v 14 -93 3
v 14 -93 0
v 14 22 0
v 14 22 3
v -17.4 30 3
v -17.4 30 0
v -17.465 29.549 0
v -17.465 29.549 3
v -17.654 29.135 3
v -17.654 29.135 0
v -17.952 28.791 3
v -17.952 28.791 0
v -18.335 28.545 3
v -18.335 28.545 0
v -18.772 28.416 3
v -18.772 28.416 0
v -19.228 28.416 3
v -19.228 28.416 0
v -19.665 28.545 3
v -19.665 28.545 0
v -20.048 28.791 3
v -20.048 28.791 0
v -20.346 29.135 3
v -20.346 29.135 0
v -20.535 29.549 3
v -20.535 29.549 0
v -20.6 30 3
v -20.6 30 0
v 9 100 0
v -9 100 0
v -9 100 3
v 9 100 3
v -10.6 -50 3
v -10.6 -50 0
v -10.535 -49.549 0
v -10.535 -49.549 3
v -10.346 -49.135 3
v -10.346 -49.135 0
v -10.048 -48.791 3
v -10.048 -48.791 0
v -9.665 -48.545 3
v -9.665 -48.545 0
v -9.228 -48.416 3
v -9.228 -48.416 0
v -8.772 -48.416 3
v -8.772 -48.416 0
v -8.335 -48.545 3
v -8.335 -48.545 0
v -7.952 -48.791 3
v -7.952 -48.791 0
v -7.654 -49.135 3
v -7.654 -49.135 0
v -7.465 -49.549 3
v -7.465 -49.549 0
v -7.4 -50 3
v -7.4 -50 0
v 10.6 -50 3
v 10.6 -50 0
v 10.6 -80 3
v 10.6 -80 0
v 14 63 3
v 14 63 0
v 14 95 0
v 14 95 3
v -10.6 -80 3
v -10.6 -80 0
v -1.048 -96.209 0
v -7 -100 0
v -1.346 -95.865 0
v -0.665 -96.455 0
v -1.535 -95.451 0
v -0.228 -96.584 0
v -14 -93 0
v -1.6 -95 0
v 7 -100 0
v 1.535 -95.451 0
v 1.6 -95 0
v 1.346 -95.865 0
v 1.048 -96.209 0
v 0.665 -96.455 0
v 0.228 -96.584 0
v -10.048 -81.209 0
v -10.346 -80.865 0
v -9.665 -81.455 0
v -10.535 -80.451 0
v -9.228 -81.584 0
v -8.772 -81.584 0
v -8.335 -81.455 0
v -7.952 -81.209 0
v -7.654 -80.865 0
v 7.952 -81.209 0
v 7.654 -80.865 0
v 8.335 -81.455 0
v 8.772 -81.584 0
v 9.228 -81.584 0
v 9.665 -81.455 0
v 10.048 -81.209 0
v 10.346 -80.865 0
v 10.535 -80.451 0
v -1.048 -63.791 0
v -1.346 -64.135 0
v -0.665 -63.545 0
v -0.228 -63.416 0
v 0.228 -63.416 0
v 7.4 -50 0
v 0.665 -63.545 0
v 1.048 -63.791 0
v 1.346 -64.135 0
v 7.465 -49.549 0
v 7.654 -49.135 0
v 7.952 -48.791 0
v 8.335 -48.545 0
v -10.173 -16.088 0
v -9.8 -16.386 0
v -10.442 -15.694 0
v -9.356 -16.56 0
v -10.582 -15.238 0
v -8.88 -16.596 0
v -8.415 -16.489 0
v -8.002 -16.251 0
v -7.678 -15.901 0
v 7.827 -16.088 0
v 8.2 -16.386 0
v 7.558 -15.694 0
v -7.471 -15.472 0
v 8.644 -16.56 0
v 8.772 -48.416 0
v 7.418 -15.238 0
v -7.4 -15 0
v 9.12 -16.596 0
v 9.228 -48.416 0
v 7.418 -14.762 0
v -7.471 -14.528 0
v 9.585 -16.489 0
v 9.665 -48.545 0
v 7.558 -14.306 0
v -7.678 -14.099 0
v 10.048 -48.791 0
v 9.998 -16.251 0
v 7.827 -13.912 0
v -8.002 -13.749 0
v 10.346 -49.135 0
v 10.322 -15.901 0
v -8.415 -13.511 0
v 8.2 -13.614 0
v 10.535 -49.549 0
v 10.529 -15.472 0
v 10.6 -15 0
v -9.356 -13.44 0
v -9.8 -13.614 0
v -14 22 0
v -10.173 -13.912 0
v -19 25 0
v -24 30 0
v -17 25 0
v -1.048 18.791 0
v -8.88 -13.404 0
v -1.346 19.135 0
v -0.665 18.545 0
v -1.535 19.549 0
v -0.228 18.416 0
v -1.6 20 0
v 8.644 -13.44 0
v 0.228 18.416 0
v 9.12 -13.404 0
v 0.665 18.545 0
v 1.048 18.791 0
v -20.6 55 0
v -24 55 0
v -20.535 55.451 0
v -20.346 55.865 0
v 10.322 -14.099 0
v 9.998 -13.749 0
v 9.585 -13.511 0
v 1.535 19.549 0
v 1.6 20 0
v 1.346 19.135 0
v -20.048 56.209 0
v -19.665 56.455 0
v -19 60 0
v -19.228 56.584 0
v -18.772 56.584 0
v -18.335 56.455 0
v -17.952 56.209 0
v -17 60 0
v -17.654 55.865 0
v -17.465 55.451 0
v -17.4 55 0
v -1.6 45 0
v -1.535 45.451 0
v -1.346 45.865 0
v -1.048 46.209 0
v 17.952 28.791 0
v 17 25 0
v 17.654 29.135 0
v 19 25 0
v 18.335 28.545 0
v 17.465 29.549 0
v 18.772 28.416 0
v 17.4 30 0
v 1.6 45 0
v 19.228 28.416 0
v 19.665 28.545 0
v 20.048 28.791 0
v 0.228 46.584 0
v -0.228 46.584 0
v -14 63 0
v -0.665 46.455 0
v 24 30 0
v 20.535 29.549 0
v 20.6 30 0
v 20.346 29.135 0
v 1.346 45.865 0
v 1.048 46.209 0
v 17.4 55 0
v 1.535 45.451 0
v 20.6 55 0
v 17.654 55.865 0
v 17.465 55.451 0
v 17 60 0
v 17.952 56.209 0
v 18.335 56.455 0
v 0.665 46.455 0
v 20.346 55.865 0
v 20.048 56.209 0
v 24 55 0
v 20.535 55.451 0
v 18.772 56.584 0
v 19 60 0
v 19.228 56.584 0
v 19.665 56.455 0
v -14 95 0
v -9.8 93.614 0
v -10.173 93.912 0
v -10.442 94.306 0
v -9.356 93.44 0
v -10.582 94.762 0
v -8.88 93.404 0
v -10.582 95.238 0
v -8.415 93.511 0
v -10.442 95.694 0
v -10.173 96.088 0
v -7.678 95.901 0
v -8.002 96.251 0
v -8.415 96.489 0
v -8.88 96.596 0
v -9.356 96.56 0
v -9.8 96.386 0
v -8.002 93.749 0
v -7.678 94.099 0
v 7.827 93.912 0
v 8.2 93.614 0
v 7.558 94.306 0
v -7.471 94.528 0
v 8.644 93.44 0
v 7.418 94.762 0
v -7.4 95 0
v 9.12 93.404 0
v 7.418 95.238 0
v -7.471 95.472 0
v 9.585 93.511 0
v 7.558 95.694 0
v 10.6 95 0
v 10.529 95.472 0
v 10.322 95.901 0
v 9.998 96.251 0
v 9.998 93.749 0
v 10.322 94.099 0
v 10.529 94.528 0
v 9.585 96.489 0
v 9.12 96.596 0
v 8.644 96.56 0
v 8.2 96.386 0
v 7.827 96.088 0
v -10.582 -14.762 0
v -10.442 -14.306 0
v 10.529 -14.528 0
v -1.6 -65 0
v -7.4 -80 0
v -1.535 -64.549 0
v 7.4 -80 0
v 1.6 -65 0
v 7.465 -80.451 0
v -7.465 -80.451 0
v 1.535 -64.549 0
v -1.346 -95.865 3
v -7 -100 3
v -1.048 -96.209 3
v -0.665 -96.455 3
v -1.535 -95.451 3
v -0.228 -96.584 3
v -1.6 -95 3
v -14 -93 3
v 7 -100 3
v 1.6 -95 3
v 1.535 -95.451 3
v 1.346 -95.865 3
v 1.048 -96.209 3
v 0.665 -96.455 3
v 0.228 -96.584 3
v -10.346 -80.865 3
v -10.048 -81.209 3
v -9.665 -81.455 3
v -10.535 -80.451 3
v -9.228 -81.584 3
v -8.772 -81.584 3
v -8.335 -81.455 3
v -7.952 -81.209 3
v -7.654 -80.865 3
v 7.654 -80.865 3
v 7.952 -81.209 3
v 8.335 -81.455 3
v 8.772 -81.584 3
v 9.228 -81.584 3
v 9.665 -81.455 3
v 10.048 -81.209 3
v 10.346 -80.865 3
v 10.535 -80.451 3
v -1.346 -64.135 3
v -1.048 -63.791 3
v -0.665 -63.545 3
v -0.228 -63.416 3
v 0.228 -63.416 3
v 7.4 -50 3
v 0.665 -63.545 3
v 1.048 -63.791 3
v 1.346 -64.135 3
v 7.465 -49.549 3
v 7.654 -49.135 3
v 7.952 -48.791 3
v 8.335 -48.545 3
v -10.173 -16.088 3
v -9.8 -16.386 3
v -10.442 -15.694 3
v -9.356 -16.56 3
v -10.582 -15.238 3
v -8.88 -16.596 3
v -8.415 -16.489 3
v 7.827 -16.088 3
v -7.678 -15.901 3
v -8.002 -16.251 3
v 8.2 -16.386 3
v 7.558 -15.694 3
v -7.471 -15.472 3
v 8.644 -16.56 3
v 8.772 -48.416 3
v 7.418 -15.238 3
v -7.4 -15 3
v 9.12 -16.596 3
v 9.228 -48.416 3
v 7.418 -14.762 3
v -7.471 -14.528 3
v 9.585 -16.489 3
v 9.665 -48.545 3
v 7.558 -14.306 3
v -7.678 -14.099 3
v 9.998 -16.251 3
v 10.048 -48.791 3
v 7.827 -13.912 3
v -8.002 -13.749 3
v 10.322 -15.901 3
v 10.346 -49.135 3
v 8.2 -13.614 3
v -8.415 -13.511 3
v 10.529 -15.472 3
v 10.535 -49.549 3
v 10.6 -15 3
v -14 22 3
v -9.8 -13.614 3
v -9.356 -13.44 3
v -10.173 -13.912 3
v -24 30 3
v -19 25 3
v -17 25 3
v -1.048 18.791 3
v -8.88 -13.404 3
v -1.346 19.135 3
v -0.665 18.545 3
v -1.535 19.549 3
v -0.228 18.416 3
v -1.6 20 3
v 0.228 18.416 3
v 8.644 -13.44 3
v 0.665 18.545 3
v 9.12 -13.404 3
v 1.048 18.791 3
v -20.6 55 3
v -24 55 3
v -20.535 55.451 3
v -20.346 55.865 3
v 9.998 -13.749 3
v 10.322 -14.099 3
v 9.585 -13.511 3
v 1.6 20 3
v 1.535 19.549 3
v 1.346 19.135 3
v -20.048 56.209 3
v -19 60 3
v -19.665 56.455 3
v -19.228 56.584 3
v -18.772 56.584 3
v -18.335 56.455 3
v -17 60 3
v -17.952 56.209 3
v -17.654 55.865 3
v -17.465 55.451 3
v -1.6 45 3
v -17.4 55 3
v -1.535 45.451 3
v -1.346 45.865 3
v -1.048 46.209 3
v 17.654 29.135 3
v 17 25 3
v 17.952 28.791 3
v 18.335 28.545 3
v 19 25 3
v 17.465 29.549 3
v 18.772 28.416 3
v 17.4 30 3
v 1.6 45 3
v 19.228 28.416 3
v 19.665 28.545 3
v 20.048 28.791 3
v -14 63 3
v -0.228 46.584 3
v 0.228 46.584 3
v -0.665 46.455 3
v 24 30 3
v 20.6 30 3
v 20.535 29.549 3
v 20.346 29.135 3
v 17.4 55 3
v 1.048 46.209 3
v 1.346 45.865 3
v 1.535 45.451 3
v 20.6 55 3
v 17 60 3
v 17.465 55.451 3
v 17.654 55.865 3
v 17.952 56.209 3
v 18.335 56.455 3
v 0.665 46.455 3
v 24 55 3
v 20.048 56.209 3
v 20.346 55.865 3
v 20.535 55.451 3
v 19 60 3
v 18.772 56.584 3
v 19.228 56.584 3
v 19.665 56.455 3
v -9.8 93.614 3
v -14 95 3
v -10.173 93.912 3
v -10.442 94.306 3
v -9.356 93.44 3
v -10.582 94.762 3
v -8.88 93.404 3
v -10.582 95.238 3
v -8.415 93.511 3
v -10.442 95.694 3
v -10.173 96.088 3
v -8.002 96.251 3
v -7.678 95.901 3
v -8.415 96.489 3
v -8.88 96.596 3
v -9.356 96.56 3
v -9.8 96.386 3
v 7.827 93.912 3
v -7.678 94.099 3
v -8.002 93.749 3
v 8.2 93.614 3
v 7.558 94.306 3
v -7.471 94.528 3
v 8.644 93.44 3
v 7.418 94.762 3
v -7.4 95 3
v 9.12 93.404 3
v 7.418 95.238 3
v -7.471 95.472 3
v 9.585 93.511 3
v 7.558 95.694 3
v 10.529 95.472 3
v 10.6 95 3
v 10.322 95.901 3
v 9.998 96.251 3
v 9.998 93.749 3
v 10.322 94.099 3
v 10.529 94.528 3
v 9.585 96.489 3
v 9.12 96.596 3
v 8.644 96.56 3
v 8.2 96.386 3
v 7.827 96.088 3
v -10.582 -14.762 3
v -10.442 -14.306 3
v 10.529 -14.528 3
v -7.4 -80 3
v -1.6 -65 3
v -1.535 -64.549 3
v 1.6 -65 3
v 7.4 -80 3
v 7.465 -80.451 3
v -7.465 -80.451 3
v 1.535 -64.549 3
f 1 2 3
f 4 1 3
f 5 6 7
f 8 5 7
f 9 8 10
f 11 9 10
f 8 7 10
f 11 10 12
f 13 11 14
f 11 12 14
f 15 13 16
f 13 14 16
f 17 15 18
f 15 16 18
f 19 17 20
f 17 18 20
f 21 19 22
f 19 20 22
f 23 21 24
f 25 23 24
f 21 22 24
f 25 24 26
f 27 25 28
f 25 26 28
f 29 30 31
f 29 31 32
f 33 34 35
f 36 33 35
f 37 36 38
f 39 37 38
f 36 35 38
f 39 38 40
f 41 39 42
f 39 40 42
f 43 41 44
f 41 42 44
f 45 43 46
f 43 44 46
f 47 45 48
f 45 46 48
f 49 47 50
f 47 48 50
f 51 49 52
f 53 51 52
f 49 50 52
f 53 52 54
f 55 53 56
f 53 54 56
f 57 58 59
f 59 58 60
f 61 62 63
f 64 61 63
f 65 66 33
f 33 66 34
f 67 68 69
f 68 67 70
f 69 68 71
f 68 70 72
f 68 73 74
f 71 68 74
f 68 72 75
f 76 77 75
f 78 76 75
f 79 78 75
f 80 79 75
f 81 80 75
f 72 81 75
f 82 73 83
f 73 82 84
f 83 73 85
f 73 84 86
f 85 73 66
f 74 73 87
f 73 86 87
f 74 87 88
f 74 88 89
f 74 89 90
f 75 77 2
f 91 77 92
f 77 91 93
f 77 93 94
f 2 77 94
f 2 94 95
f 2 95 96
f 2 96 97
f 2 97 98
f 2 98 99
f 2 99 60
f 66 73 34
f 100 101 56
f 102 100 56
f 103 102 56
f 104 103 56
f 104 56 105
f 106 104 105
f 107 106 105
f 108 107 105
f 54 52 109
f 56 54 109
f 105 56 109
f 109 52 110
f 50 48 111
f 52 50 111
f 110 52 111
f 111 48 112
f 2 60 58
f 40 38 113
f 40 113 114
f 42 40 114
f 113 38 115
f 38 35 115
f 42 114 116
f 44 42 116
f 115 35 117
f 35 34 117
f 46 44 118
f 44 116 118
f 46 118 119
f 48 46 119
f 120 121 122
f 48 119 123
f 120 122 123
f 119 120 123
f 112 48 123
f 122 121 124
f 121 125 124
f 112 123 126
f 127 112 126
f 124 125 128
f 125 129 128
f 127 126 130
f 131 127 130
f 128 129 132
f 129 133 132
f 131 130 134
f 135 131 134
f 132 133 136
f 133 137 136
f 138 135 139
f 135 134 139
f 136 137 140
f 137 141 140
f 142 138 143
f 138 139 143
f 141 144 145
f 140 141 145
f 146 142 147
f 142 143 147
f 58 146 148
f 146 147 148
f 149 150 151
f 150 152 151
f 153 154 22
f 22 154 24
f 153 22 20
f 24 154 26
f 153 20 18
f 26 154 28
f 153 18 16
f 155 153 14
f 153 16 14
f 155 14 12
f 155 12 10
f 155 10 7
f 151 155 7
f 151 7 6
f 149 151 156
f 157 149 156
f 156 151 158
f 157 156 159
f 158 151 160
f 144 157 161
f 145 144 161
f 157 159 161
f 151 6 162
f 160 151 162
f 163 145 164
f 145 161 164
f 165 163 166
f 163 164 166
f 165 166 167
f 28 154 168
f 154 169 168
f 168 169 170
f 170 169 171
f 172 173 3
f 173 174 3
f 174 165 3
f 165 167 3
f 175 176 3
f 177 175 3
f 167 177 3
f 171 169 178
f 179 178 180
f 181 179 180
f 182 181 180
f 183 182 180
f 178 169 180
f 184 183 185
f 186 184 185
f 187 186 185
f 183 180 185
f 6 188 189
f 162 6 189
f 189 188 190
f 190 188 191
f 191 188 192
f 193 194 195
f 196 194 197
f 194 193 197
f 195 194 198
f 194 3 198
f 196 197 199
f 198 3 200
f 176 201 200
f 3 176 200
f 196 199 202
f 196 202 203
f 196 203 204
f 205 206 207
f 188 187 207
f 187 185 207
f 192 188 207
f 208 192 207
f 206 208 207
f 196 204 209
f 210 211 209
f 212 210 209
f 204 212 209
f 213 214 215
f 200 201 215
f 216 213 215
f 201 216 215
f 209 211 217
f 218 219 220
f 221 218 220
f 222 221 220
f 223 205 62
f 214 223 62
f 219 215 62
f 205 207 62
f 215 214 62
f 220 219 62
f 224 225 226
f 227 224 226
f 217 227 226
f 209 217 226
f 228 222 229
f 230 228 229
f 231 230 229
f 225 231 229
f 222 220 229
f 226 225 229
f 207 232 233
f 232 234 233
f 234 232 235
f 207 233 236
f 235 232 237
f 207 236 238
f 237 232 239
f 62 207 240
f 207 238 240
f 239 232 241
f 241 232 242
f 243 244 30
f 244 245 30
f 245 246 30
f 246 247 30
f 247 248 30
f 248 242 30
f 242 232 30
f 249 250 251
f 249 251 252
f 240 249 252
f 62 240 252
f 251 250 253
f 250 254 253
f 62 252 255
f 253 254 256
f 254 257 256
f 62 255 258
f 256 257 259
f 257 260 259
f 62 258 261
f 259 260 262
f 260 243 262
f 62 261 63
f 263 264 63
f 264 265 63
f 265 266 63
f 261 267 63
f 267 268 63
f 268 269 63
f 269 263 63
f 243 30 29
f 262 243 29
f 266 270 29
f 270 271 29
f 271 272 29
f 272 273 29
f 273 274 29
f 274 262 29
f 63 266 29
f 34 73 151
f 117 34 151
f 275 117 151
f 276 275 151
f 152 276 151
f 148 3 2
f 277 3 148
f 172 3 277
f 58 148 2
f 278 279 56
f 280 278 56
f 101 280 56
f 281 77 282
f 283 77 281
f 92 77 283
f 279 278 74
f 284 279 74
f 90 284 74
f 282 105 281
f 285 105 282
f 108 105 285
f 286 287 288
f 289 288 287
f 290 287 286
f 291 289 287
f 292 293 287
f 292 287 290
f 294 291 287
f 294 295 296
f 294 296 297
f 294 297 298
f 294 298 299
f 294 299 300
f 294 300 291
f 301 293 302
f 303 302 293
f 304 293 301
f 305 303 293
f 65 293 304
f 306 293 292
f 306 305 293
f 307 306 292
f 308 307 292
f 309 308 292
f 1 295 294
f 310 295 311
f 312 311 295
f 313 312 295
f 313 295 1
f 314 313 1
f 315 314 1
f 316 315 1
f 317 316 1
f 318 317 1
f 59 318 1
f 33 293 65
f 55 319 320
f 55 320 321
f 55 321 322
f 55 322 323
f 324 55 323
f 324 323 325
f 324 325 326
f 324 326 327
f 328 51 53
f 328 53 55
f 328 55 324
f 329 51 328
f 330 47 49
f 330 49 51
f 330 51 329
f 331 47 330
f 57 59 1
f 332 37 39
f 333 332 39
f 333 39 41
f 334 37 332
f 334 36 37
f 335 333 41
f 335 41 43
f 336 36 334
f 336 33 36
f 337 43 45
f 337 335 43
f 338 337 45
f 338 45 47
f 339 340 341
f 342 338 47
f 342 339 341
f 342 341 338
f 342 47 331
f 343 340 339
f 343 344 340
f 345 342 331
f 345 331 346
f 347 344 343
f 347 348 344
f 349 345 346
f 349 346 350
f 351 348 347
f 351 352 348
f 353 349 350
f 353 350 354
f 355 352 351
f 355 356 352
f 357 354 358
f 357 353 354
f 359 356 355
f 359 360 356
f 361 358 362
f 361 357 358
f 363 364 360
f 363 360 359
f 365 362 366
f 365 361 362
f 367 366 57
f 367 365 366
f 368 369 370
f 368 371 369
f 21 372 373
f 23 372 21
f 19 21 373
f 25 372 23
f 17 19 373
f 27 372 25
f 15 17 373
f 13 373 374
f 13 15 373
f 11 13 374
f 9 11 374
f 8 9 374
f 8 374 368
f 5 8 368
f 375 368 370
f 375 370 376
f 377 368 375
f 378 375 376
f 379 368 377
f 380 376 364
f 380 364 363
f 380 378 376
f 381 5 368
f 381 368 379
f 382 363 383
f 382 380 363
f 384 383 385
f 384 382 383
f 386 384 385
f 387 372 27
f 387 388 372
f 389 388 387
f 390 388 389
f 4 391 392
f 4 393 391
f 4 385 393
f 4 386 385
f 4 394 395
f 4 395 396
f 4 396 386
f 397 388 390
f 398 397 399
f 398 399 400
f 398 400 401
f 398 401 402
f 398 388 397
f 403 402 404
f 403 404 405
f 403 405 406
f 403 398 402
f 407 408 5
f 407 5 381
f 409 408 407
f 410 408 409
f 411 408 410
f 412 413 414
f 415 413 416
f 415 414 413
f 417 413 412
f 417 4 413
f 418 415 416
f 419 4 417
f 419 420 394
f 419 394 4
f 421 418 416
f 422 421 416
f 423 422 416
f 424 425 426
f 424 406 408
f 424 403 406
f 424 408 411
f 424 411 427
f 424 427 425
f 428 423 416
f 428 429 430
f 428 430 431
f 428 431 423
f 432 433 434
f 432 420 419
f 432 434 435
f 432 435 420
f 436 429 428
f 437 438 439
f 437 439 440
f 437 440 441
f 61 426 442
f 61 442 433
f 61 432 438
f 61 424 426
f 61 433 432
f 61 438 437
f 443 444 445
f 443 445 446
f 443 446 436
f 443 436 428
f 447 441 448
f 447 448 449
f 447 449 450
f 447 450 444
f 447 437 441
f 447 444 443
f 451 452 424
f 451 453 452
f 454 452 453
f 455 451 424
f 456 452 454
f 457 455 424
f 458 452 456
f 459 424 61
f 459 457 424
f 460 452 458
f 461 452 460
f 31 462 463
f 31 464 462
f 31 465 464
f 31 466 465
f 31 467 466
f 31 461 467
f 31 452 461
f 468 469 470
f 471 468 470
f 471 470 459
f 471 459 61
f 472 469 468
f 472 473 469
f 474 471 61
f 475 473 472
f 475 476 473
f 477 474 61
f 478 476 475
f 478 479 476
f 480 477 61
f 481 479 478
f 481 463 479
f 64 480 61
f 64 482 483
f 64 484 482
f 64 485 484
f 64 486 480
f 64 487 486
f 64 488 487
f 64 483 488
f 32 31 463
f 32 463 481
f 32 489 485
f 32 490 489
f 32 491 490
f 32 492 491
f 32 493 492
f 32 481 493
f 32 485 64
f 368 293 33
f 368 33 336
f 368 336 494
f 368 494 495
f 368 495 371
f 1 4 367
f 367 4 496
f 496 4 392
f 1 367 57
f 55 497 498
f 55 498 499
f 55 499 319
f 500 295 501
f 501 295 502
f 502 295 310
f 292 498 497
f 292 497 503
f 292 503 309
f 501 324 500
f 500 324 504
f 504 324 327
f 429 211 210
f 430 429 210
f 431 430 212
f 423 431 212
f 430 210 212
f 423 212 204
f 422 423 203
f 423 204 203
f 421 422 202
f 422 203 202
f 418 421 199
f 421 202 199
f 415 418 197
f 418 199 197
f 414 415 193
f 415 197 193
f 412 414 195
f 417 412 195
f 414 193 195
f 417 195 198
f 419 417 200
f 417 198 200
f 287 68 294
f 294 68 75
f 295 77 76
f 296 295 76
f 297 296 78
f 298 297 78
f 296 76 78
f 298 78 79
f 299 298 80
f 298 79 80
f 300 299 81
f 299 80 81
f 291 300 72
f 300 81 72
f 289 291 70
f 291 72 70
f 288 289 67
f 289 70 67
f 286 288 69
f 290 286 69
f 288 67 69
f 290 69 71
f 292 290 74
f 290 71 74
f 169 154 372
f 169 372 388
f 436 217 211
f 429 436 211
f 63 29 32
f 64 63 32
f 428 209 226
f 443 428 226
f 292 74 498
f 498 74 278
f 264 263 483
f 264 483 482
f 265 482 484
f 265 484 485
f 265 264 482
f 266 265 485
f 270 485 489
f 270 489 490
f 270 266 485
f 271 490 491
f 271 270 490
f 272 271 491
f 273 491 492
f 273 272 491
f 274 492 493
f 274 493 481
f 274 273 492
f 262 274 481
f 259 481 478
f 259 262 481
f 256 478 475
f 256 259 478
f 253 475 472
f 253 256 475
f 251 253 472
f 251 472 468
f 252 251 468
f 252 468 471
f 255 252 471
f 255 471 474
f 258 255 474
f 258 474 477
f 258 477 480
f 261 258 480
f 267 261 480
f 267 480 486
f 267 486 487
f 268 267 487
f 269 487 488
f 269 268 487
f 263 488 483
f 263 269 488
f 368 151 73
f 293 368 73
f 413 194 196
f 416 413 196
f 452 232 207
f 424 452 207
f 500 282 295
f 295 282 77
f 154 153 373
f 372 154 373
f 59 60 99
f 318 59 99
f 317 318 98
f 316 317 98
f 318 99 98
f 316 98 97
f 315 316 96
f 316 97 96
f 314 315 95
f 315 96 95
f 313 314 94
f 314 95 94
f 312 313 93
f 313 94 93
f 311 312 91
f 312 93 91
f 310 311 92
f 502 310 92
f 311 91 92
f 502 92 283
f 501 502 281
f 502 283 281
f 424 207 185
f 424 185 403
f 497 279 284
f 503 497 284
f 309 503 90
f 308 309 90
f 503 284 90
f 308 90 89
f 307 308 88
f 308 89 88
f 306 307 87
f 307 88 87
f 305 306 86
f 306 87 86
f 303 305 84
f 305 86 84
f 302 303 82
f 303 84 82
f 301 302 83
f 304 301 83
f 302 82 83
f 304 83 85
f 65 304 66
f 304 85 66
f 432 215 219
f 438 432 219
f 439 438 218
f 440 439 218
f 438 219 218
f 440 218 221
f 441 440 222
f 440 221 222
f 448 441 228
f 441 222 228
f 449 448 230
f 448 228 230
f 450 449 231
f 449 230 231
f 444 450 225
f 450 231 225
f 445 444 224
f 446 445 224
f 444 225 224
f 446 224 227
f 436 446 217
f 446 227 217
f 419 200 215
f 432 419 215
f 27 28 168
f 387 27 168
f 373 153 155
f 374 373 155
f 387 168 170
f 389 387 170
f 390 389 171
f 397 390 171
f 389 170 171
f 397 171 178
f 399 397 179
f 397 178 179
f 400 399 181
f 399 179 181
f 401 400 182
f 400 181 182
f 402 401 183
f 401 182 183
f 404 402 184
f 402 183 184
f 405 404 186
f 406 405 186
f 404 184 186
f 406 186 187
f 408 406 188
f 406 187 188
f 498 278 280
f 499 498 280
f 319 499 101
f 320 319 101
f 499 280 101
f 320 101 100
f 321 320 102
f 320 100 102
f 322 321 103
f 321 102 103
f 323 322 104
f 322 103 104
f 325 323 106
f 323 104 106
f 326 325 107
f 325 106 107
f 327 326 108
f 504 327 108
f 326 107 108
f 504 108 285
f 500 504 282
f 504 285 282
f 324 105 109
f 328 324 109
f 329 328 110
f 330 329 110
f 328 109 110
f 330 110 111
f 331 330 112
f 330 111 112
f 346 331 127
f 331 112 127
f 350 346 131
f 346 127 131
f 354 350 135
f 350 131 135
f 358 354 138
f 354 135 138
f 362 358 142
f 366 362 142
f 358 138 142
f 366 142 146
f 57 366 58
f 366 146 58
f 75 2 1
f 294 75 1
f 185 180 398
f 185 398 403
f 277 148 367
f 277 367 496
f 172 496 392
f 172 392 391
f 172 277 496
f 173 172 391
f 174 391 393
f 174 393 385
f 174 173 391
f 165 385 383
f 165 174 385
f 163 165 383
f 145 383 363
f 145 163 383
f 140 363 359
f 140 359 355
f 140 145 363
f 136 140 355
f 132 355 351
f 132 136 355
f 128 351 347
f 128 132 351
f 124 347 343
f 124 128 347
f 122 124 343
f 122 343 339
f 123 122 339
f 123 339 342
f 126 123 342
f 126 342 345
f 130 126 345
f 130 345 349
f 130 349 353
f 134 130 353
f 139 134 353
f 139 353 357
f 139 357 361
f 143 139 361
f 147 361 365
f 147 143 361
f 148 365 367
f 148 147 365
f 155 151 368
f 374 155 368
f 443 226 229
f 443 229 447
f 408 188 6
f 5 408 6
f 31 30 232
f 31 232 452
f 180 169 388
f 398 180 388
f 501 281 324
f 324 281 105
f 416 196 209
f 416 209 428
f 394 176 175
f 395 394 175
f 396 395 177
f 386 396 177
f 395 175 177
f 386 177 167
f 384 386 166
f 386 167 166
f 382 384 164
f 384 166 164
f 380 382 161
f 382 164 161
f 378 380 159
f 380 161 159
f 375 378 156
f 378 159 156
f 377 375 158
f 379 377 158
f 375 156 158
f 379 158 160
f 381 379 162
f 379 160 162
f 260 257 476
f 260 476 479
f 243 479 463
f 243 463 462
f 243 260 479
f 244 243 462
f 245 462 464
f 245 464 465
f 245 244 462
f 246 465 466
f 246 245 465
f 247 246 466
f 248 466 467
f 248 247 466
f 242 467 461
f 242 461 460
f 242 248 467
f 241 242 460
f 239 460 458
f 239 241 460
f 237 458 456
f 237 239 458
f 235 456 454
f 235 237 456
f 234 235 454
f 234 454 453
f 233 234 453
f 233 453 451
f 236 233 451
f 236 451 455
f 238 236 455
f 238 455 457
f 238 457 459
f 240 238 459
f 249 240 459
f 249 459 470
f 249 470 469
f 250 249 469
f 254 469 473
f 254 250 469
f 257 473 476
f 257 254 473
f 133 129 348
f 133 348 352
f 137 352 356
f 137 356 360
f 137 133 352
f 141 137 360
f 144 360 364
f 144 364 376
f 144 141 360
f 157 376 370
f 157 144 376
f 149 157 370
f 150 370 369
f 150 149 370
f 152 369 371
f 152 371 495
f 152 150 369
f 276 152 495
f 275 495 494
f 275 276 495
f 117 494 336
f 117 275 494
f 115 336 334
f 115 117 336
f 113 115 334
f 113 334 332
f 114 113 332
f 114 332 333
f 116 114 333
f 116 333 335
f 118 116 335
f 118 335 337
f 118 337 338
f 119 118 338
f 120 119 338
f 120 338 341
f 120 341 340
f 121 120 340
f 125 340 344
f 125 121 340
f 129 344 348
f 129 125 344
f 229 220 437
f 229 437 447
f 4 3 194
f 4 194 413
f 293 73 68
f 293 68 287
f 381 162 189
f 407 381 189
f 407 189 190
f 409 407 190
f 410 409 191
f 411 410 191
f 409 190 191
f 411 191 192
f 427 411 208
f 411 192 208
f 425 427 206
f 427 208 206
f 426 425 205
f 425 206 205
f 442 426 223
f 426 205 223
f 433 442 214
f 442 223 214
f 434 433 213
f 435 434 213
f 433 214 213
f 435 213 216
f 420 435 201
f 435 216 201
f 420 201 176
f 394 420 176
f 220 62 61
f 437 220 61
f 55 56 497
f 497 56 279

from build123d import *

# Parameters (mm, degrees)
F0_W     = 28
F0_H     = 40
F0_R     = 1.6
F0_W_2   = 10
F0_H_2   = 35
F1_DEPTH = 3
F2_SIZE  = 5
F3_SIZE  = 3
F4_SIZE  = 7


with BuildPart() as f1:
    # F0 (on Top) → F1 (new body)
    with BuildSketch(Plane.XY):
        with Locations((0, 80)):
            Rectangle(F0_W, F0_H)
        with Locations((-9, 95)):
            Circle(F0_R, mode=Mode.SUBTRACT)
        with Locations((9, 95)):
            Circle(F0_R, mode=Mode.SUBTRACT)
        with Locations((19, 42.5)):
            Rectangle(F0_W_2, F0_H_2)
        with BuildLine():
            ThreePointArc((17.4, 55), (19, 56.6), (20.6, 55))
            Line((20.6, 55), (20.6, 30))
            ThreePointArc((20.6, 30), (19, 28.4), (17.4, 30))
            Line((17.4, 30), (17.4, 55))
        make_face(mode=Mode.SUBTRACT)
        with BuildLine():
            Line((14, 25), (14, 60))
            Line((14, 60), (-14, 60))
            Line((-14, 60), (-14, 25))
            Line((-14, 25), (-1.6, 25))
            Line((-1.6, 25), (-1.6, 45))
            ThreePointArc((-1.6, 45), (0, 46.6), (1.6, 45))
            Line((1.6, 45), (1.6, 25))
            Line((1.6, 25), (14, 25))
        make_face()
        with Locations((-19, 42.5)):
            Rectangle(F0_W_2, F0_H_2)
        with BuildLine():
            ThreePointArc((-20.6, 55), (-19, 56.6), (-17.4, 55))
            Line((-17.4, 55), (-17.4, 30))
            ThreePointArc((-17.4, 30), (-19, 28.4), (-20.6, 30))
            Line((-20.6, 30), (-20.6, 55))
        make_face(mode=Mode.SUBTRACT)
        with BuildLine():
            Line((14, -100), (14, 25))
            Line((14, 25), (1.6, 25))
            Line((1.6, 25), (1.6, 20))
            ThreePointArc((1.6, 20), (0, 18.4), (-1.6, 20))
            Line((-1.6, 20), (-1.6, 25))
            Line((-1.6, 25), (-14, 25))
            Line((-14, 25), (-14, -100))
            Line((-14, -100), (14, -100))
        make_face()
        with BuildLine():
            ThreePointArc((-10.6, -50), (-9, -48.4), (-7.4, -50))
            Line((-7.4, -50), (-7.4, -80))
            ThreePointArc((-7.4, -80), (-9, -81.6), (-10.6, -80))
            Line((-10.6, -80), (-10.6, -50))
        make_face(mode=Mode.SUBTRACT)
        with Locations((-9, -15)):
            Circle(F0_R, mode=Mode.SUBTRACT)
        with BuildLine():
            Line((1.6, -65), (1.6, -95))
            ThreePointArc((1.6, -95), (0, -96.6), (-1.6, -95))
            Line((-1.6, -95), (-1.6, -65))
            ThreePointArc((-1.6, -65), (0, -63.4), (1.6, -65))
        make_face(mode=Mode.SUBTRACT)
        with BuildLine():
            Line((10.6, -50), (10.6, -80))
            ThreePointArc((10.6, -80), (9, -81.6), (7.4, -80))
            Line((7.4, -80), (7.4, -50))
            ThreePointArc((7.4, -50), (9, -48.4), (10.6, -50))
        make_face(mode=Mode.SUBTRACT)
        with Locations((9, -15)):
            Circle(F0_R, mode=Mode.SUBTRACT)
    extrude(amount=F1_DEPTH)

    # F2
    f2_edges = [f1.edges().sort_by_distance(p)[0] for p in [
        (-14, 100, 1.5),
        (14, 100, 1.5),
        (-24, 60, 1.5),
        (24, 60, 1.5),
        (-24, 25, 1.5),
        (24, 25, 1.5),
    ]]
    chamfer(f2_edges, length=F2_SIZE)

    # F3
    f3_edges = [f1.edges().sort_by_distance(p)[0] for p in [
        (14, 25, 1.5),
        (-14, 25, 1.5),
        (-14, 60, 1.5),
        (14, 60, 1.5),
    ]]
    chamfer(f3_edges, length=F3_SIZE)

    # F4
    f4_edges = [f1.edges().sort_by_distance(p)[0] for p in [
        (14, -100, 1.5),
        (-14, -100, 1.5),
    ]]
    chamfer(f4_edges, length=F4_SIZE)


solid = f1.part
